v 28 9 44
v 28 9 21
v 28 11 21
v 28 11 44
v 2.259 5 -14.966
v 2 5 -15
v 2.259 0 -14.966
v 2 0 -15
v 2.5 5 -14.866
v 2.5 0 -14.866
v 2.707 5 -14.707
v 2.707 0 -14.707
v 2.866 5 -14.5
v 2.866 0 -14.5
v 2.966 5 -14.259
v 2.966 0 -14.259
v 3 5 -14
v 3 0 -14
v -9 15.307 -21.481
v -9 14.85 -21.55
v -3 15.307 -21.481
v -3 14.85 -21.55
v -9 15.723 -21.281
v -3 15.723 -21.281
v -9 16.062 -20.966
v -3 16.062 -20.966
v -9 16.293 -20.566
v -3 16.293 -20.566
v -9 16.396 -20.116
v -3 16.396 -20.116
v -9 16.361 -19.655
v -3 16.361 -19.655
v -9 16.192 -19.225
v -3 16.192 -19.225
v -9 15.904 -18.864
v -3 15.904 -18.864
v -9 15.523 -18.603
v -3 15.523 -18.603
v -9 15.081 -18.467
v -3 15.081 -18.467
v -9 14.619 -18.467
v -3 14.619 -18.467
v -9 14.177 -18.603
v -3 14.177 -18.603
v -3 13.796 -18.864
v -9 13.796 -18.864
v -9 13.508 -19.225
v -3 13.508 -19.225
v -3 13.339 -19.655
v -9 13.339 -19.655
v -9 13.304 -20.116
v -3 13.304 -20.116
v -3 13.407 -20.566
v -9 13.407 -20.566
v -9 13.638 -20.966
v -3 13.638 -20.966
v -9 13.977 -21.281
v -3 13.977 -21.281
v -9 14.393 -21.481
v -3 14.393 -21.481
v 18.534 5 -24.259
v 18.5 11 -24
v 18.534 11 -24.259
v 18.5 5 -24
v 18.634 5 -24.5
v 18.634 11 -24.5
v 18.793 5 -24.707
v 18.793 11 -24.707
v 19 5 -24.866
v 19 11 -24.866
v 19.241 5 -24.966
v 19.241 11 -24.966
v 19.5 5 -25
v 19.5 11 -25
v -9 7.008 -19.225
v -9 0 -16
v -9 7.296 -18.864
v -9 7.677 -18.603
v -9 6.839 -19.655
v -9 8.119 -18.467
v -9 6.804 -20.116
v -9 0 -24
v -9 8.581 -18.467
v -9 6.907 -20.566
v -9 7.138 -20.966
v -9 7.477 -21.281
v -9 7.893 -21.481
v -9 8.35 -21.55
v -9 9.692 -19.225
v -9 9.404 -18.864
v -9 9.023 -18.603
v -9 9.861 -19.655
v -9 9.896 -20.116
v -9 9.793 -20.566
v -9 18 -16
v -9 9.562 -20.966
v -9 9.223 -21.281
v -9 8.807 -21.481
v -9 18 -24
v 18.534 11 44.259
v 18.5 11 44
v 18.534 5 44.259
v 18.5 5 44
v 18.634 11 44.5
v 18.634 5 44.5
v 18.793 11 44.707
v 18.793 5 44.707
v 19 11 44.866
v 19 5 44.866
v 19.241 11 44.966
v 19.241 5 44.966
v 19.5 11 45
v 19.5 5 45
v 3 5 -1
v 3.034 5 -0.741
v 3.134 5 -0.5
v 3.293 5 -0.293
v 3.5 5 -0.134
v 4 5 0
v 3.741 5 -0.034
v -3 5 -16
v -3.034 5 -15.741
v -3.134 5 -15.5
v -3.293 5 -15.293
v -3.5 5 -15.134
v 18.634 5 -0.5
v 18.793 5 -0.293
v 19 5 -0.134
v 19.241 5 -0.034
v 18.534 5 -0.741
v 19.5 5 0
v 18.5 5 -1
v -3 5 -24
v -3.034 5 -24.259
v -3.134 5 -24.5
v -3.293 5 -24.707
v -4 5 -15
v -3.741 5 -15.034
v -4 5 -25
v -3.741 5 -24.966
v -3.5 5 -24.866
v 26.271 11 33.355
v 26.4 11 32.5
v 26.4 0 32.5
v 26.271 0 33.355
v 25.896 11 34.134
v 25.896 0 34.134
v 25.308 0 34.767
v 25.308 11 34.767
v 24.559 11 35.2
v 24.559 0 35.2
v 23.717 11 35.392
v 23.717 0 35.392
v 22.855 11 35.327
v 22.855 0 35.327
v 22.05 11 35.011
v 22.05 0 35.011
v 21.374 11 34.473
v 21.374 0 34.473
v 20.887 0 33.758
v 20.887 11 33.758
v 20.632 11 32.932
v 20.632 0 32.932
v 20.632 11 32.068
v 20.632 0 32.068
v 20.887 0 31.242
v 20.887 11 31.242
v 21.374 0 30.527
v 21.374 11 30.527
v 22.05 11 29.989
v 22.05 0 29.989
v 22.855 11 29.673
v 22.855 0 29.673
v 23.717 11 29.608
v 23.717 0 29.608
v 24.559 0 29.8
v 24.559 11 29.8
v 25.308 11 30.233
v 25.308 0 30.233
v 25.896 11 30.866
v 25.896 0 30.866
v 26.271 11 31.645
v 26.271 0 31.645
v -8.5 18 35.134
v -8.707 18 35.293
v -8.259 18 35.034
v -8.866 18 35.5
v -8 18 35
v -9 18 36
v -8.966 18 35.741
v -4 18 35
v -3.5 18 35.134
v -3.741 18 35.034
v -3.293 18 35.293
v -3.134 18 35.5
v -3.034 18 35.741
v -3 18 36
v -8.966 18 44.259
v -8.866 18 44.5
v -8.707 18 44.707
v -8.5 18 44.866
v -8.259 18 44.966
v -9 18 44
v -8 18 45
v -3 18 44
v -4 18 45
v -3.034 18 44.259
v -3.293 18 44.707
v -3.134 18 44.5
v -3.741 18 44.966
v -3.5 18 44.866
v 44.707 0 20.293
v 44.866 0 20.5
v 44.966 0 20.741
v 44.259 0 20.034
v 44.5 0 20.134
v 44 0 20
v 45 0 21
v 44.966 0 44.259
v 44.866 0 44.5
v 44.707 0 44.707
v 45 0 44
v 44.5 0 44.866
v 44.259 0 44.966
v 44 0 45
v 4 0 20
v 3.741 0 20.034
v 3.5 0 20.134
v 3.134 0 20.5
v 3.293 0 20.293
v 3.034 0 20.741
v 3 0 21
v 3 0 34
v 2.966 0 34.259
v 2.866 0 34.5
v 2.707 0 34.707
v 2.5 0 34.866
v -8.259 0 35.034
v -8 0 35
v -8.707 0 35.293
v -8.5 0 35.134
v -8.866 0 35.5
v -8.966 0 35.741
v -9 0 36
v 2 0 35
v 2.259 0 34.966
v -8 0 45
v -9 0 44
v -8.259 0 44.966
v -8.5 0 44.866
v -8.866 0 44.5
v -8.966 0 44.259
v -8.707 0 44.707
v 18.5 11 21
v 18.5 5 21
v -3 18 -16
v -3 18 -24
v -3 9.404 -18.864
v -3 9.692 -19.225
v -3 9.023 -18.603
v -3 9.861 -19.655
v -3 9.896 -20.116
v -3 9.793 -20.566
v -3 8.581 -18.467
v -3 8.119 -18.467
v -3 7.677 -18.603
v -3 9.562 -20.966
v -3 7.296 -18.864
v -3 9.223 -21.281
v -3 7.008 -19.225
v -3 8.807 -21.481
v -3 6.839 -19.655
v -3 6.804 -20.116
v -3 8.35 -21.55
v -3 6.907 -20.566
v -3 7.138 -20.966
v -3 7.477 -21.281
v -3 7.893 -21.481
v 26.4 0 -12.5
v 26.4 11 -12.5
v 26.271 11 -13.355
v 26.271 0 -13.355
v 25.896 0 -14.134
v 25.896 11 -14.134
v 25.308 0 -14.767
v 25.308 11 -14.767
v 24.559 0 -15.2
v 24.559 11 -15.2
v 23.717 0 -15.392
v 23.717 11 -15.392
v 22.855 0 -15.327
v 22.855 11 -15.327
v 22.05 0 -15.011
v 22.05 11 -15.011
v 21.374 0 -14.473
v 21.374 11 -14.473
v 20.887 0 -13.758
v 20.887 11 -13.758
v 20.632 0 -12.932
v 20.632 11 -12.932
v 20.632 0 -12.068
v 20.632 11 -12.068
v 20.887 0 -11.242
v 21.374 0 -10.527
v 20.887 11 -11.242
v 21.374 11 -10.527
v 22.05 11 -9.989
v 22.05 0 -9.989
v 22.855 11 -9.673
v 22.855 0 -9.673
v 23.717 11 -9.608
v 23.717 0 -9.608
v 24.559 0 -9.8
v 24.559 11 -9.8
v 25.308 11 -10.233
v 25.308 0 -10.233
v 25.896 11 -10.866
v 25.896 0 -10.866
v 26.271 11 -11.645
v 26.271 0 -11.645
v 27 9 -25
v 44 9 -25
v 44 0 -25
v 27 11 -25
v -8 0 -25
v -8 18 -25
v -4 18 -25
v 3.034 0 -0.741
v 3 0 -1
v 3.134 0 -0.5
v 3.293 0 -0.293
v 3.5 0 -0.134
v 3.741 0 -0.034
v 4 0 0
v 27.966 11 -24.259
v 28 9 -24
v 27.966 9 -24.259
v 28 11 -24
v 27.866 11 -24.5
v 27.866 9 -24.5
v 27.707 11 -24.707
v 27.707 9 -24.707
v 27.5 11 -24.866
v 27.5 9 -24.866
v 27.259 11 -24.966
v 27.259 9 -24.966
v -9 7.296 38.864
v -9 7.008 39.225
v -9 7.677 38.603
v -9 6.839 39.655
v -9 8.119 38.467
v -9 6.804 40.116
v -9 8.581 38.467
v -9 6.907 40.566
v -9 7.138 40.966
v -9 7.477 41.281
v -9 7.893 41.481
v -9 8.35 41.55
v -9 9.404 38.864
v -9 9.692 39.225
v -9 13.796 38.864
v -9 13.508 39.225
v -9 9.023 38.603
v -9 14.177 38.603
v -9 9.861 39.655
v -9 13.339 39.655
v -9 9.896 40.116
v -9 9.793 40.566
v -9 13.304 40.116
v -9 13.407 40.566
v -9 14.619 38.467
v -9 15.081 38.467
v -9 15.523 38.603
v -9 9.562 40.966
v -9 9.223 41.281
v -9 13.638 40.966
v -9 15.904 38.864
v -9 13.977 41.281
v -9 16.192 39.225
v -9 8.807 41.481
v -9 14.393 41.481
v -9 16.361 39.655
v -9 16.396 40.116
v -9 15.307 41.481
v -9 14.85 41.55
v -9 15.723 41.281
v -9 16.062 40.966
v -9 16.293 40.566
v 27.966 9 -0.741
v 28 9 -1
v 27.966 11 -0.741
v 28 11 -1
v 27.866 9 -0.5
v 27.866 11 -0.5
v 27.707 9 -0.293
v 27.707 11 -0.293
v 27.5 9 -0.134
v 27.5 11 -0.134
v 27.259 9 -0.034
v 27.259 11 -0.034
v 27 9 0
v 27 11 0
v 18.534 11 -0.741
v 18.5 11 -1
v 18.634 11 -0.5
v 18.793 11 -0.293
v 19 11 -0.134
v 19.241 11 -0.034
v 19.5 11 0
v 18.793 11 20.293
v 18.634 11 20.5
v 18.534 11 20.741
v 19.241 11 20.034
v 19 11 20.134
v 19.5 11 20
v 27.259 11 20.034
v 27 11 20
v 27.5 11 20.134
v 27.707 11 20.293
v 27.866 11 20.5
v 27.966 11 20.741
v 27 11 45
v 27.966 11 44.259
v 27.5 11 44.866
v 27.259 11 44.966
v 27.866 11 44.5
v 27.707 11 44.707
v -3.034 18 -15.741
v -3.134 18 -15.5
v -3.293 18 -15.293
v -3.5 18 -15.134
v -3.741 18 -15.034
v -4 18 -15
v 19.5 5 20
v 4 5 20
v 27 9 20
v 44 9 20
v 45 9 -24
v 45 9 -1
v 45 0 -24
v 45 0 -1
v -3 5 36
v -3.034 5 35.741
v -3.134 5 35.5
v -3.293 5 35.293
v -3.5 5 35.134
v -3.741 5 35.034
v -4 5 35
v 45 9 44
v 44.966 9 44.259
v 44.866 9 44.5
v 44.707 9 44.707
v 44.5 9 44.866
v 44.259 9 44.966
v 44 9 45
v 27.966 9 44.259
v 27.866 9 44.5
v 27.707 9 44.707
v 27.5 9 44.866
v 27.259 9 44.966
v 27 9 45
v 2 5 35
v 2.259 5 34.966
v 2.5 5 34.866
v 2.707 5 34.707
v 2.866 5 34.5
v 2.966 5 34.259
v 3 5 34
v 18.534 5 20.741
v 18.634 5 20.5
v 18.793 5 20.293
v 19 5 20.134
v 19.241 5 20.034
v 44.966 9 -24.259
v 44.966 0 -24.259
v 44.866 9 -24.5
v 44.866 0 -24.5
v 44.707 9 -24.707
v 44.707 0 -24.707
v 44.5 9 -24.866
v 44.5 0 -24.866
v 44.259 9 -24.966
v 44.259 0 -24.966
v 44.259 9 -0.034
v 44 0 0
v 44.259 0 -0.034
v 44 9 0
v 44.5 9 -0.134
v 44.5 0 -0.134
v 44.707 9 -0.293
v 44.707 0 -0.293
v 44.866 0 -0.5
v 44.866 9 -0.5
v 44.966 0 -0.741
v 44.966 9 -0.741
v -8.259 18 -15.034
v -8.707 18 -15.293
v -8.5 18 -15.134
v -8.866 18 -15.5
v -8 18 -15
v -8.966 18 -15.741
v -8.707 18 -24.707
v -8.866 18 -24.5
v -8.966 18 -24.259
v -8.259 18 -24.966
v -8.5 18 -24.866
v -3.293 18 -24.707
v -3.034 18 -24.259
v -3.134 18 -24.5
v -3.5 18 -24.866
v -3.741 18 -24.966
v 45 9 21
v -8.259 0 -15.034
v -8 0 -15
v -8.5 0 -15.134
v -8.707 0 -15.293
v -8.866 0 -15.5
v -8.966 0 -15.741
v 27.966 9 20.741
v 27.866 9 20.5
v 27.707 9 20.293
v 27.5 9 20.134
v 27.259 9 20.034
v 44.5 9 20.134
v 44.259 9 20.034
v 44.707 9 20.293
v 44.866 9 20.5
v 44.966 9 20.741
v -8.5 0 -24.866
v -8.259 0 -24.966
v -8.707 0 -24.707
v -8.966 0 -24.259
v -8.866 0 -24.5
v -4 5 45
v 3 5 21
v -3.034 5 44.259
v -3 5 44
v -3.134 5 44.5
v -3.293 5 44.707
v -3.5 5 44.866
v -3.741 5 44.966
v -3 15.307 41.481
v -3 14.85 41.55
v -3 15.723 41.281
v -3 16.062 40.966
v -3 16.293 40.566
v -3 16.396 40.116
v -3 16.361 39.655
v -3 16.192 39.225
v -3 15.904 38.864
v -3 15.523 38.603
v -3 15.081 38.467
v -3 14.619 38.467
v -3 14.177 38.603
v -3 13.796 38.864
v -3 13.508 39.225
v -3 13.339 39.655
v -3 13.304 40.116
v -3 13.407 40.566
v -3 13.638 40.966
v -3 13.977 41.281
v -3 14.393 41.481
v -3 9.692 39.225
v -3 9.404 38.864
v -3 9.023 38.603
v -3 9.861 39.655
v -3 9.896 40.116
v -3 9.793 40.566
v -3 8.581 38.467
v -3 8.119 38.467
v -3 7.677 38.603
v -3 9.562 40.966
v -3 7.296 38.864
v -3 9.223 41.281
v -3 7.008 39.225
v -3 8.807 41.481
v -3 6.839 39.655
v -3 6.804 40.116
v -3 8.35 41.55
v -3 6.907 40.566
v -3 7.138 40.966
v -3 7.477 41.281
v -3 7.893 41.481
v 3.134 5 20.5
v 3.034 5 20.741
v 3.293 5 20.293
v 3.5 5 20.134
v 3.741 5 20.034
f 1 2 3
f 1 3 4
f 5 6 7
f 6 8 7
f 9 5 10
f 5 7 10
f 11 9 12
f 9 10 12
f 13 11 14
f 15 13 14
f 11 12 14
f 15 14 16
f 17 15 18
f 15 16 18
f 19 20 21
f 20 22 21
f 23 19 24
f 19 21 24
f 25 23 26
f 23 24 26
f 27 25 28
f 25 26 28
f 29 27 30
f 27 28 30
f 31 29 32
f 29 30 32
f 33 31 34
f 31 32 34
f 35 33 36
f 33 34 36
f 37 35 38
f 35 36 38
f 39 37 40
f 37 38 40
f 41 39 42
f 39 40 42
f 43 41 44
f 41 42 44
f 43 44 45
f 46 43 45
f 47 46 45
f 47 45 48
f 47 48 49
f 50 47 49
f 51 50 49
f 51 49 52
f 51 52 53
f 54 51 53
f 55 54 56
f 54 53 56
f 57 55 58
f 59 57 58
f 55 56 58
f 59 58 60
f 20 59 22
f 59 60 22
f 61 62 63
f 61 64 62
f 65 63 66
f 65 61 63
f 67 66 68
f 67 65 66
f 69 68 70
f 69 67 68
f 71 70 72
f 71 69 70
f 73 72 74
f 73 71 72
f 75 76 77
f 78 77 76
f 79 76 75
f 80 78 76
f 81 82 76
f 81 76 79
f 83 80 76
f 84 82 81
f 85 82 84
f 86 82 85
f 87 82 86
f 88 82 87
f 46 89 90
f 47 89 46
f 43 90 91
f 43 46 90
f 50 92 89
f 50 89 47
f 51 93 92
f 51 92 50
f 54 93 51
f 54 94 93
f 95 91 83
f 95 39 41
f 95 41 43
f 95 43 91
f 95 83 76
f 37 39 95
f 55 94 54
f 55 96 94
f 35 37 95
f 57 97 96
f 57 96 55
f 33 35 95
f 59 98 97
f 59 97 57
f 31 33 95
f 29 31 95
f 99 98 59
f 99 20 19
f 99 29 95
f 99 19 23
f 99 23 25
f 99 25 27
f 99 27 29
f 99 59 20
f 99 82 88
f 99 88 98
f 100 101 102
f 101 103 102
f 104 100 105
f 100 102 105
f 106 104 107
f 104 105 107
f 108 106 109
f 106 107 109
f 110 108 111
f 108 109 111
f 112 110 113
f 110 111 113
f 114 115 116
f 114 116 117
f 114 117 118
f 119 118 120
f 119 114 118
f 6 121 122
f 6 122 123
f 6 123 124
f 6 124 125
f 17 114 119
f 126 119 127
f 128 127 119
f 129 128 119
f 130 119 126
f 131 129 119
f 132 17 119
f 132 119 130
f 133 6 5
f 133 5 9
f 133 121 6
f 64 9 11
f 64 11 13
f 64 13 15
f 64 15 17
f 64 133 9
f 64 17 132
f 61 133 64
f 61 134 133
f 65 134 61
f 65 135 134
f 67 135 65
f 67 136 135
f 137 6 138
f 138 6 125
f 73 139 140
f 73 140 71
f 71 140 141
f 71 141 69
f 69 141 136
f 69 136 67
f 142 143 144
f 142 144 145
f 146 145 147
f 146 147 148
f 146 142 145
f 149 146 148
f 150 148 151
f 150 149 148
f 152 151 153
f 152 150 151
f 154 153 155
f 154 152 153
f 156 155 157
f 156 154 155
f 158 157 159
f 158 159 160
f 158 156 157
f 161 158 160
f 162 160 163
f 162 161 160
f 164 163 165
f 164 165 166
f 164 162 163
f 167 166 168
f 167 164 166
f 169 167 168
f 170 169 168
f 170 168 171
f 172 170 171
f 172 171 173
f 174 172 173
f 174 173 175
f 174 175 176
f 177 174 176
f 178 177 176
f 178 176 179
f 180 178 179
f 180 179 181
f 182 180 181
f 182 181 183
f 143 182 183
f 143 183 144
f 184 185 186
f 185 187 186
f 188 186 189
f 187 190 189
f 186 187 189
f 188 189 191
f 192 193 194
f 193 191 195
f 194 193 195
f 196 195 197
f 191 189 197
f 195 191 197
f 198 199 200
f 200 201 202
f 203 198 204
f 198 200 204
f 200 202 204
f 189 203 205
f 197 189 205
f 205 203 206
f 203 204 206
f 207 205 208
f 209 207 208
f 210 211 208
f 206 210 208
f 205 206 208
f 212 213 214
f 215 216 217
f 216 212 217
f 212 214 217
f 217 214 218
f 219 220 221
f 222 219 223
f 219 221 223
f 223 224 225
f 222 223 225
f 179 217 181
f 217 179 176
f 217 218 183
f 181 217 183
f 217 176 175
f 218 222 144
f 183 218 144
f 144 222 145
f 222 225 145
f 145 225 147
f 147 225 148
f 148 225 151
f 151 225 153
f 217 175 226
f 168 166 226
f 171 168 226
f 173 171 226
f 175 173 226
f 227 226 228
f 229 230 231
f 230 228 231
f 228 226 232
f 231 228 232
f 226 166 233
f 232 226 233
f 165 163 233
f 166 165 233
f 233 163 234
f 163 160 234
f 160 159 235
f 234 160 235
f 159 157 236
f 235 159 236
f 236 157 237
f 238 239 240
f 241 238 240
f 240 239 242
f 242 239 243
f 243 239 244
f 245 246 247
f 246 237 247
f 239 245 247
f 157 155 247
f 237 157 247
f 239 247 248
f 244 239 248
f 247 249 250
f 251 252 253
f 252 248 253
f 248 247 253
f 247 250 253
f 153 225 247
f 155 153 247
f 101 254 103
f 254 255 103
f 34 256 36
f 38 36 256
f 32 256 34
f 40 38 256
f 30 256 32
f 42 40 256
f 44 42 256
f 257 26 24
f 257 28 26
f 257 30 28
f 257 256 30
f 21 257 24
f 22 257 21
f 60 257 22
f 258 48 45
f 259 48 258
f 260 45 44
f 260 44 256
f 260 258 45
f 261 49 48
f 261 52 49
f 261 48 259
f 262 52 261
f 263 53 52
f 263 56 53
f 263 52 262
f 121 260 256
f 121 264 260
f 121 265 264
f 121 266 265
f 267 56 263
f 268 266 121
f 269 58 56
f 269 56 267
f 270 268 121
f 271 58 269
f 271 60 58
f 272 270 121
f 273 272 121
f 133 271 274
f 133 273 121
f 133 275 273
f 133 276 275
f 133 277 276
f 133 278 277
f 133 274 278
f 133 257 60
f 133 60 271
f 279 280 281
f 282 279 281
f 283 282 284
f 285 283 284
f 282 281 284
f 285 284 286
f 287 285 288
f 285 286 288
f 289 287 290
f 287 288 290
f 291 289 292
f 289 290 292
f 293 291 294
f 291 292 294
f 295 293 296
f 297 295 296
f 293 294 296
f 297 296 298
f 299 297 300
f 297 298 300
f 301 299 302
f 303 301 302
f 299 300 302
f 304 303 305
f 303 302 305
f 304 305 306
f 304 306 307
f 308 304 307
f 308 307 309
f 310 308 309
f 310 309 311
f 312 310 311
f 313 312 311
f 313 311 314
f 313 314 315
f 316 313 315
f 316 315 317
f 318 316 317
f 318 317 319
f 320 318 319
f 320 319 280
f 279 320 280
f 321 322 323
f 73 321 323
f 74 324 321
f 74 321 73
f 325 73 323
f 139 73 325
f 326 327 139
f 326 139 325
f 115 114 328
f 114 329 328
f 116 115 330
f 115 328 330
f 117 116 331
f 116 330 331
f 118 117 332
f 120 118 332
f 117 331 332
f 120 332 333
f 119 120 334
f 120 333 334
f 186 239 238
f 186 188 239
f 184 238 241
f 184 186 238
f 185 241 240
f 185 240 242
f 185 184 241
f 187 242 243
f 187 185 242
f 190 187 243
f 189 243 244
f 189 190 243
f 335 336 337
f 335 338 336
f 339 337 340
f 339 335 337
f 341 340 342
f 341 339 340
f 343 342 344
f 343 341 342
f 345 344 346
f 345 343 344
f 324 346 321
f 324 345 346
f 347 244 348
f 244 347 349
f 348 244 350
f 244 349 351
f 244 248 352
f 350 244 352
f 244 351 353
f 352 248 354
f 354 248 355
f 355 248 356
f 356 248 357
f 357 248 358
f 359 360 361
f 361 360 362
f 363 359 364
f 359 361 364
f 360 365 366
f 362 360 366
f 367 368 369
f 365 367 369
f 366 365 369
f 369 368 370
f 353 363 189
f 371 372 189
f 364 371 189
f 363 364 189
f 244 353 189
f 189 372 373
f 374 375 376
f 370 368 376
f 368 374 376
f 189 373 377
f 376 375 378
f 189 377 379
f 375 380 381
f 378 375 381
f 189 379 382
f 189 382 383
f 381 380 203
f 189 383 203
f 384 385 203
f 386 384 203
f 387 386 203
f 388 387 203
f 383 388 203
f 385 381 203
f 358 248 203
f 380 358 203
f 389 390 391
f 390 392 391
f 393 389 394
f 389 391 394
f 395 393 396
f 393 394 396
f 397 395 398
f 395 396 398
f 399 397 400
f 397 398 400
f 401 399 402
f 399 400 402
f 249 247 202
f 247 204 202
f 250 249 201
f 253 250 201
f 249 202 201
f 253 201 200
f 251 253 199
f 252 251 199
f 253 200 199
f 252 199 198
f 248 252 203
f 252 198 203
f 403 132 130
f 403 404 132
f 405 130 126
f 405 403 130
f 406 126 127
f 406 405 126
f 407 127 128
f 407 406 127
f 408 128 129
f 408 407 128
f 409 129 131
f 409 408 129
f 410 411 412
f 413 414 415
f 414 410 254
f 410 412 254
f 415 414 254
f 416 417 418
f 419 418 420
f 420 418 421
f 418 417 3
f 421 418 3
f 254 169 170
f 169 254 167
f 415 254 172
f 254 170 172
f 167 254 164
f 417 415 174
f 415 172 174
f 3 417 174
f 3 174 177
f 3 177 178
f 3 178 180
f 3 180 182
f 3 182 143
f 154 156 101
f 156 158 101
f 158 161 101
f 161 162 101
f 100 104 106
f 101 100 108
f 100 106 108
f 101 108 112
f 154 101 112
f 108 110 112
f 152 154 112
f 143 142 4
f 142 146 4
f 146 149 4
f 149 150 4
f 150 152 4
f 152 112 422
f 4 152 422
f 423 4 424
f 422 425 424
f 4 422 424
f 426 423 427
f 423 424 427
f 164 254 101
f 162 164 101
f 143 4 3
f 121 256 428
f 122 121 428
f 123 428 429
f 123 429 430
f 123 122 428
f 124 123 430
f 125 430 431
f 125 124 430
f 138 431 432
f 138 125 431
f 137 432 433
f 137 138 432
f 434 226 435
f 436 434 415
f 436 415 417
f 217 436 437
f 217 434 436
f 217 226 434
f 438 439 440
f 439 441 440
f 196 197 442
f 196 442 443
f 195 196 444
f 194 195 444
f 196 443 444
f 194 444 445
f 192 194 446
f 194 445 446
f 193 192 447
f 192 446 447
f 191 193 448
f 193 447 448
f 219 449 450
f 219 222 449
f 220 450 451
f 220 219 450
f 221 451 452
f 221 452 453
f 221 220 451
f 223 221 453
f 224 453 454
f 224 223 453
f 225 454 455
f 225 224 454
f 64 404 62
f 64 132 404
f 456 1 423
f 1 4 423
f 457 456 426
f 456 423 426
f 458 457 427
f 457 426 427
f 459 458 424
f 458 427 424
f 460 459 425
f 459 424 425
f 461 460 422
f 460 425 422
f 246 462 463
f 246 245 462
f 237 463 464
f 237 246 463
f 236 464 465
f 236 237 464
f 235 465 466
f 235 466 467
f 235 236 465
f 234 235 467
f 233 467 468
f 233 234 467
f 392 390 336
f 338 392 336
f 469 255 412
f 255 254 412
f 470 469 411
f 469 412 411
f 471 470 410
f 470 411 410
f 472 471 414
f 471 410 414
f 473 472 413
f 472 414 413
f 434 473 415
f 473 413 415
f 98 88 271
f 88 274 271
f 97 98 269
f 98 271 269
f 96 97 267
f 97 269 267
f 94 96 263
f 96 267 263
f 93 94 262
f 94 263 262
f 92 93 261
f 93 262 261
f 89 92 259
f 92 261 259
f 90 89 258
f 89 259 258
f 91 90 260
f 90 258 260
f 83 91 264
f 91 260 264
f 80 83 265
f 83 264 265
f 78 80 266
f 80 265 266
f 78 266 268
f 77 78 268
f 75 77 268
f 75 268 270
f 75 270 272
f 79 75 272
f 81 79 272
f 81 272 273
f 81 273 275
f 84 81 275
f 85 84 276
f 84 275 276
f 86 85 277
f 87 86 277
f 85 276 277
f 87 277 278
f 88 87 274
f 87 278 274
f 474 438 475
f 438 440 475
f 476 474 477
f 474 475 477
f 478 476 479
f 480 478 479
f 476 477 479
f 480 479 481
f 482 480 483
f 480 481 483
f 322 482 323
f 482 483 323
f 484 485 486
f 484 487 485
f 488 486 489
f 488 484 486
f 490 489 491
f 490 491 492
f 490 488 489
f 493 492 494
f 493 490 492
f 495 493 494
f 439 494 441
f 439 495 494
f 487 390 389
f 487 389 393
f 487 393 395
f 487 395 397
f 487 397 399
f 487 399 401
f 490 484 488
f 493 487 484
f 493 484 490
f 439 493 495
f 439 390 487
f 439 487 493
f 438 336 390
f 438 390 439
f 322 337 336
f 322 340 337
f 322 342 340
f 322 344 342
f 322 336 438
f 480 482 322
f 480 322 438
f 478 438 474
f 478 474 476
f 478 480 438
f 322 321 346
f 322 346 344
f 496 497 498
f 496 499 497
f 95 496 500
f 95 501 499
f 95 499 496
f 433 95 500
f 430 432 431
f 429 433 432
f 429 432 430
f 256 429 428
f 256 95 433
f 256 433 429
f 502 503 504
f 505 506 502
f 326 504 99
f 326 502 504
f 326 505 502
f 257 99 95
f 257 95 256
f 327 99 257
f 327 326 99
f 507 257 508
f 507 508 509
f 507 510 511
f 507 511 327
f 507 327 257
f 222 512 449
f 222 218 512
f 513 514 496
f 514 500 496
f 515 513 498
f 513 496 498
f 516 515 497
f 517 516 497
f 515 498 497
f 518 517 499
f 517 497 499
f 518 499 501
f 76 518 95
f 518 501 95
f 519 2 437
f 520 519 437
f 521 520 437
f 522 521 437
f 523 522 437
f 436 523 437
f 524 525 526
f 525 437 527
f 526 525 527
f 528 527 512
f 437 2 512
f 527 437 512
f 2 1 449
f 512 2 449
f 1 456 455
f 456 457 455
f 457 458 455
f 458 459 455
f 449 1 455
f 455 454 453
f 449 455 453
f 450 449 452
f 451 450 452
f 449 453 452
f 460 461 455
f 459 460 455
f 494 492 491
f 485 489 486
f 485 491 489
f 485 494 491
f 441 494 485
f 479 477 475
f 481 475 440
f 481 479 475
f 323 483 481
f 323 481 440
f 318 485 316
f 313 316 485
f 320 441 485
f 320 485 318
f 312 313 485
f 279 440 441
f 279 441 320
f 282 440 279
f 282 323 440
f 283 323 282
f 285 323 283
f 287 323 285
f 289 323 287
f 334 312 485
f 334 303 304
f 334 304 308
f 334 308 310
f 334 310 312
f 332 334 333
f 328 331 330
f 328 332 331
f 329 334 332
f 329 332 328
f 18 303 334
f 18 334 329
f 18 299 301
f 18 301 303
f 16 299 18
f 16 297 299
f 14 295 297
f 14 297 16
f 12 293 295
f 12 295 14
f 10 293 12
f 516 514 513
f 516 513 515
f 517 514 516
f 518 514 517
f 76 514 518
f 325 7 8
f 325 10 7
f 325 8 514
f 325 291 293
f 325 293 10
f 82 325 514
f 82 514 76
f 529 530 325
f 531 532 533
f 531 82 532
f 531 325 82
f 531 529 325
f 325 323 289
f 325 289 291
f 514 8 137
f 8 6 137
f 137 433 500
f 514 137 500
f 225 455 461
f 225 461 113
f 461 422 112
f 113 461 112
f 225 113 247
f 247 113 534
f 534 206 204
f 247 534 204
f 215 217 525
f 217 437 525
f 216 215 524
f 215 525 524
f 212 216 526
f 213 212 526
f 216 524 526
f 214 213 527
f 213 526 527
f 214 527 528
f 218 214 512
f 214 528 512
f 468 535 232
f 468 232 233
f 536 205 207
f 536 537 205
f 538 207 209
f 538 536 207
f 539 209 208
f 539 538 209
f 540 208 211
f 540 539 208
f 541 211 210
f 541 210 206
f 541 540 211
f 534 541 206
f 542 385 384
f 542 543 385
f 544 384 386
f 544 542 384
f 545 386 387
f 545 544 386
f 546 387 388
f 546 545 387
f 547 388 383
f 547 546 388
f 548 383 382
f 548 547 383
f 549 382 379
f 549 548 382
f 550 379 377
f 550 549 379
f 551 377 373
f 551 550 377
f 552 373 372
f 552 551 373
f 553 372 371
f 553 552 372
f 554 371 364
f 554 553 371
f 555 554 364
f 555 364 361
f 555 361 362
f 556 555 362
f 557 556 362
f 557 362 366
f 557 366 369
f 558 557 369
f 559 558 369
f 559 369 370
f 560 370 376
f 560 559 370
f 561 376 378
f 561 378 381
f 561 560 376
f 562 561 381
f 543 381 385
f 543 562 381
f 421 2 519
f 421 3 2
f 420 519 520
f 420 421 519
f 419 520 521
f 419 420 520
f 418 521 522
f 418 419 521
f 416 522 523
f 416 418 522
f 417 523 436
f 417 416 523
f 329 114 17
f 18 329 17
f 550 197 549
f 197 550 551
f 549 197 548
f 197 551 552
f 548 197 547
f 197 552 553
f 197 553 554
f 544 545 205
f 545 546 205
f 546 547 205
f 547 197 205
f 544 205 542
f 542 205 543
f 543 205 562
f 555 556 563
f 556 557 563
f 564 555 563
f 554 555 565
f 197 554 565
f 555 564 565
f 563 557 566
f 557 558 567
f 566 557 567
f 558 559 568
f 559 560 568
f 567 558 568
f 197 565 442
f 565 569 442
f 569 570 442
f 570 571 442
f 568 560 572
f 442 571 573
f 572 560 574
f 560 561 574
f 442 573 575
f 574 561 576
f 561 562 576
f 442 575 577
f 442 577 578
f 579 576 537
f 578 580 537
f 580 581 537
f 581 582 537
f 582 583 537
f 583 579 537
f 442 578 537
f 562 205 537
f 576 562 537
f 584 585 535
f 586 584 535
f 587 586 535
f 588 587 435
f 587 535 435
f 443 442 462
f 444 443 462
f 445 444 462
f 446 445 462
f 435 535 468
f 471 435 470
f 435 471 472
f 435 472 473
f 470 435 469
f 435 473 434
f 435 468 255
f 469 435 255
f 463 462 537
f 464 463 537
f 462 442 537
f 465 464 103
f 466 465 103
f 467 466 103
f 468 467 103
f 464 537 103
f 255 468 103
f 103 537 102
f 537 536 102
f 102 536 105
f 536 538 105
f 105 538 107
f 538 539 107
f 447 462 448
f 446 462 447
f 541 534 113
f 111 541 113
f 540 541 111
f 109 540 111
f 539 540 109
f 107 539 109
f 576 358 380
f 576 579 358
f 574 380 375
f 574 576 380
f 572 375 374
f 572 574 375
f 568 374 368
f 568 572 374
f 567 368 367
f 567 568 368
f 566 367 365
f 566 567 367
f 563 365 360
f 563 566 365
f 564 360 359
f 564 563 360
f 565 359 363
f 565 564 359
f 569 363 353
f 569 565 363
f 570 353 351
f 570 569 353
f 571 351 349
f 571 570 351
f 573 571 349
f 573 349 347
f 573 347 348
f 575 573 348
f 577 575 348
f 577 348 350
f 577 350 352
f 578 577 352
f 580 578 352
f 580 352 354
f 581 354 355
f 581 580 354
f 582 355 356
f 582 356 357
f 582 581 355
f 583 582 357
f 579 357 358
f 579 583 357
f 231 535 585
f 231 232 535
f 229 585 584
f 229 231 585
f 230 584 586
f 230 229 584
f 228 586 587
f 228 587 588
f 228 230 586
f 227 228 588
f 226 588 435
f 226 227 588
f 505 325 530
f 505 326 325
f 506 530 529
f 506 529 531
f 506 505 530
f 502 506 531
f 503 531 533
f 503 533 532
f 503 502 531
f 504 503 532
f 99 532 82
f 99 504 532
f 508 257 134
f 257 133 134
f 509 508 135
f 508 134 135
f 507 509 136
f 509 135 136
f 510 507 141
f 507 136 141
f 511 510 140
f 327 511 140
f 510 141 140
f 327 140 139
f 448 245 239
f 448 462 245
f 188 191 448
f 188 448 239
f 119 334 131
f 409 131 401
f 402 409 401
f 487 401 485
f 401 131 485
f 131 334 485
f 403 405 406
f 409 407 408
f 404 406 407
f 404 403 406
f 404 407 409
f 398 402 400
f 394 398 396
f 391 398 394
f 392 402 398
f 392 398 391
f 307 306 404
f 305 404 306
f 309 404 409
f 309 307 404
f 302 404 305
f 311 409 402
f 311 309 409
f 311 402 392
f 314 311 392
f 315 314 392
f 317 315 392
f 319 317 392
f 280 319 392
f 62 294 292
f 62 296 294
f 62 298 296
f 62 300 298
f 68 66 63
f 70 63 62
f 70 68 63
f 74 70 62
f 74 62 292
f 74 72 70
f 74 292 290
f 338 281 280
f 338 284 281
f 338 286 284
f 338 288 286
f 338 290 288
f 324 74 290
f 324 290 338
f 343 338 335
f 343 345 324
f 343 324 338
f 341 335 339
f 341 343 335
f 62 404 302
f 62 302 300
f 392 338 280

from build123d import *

# Parameters (mm, degrees)
SKETCH1_W                  = 45
SKETCH1_H                  = 25
BOSS_EXTRUDE1_DEPTH        = 5
SKETCH5_W                  = 26.5
SKETCH5_H                  = 25
BOSS_EXTRUDE3_DEPTH        = 4
SKETCH11_W                 = 9.5
SKETCH11_H                 = 25
BOSS_EXTRUDE5_DEPTH        = 2
SKETCH12_W                 = 3
SKETCH12_H                 = 25
CUT_EXTRUDE2_DEPTH         = 52.826634079
M5_CLEARANCE_HOLE1_D       = 5.8
BOSS_EXTRUDE8_DEPTH        = 10
M2_5_CLEARANCE_HOLE1_D     = 3.1
M2_5_CLEARANCE_HOLE1_DEPTH = 6
M2_5_CLEARANCE_HOLE1_TIP   = 0.931333959
FILLET2_R                  = 1


with BuildPart() as part:
    # Sketch1 → Boss-Extrude1 (new body)
    with BuildSketch(Plane(origin=(0, 0, 0), x_dir=(1, 0, 0), z_dir=(0, 1, 0))):
        with Locations((22.5, 12.5)):
            Rectangle(SKETCH1_W, SKETCH1_H)
    extrude(amount=BOSS_EXTRUDE1_DEPTH)

    # Sketch5 → Boss-Extrude3 (add)
    with BuildSketch(Plane(origin=(0, 5, 0), x_dir=(1, 0, 0), z_dir=(0, 1, 0))):
        with Locations((31.75, 12.5)):
            Rectangle(SKETCH5_W, SKETCH5_H)
    extrude(amount=BOSS_EXTRUDE3_DEPTH)

    # Sketch11 → Boss-Extrude5 (add)
    with BuildSketch(Plane(origin=(0, 9, 0), x_dir=(1, 0, 0), z_dir=(0, 1, 0))):
        with Locations((23.25, 12.5)):
            Rectangle(SKETCH11_W, SKETCH11_H)
    extrude(amount=BOSS_EXTRUDE5_DEPTH)

    # Sketch12 → Cut-Extrude2 (cut, through all)
    with BuildSketch(Plane(origin=(0, 5, 0), x_dir=(1, 0, 0), z_dir=(0, 1, 0))):
        with Locations((1.5, 12.5)):
            Rectangle(SKETCH12_W, SKETCH12_H)
    extrude(amount=-CUT_EXTRUDE2_DEPTH, mode=Mode.SUBTRACT)

    # M5 Clearance Hole1 (through all)
    with Locations(Plane(origin=(0, 0, 0), x_dir=(-1, 0, 0), z_dir=(0, -1, 0))):
        with Locations((-23.5, 12.5)):
            Hole(M5_CLEARANCE_HOLE1_D / 2)

    # Sketch18 → Boss-Extrude8 (add)
    with BuildSketch(Plane(origin=(0, 0, -25), x_dir=(-1, 0, 0), z_dir=(0, 0, -1))):
        Polygon((-3, 0), (9, 0), (9, 18), (3, 18), (3, 5), (-3, 5), align=None)
    extrude(amount=-BOSS_EXTRUDE8_DEPTH)

    # M2.5 Clearance Hole1
    with Locations(Plane.ZY.offset(9)):
        with Locations((-20, 14.85), (-20, 8.35)):
            Hole(M2_5_CLEARANCE_HOLE1_D / 2, depth=M2_5_CLEARANCE_HOLE1_DEPTH)
            with Locations((0, 0, -(M2_5_CLEARANCE_HOLE1_DEPTH + M2_5_CLEARANCE_HOLE1_TIP / 2))):  # 118° drill point
                Cone(0, M2_5_CLEARANCE_HOLE1_D / 2, M2_5_CLEARANCE_HOLE1_TIP, mode=Mode.SUBTRACT)

    # Fillet2
    fillet2_edges = [part.edges().sort_by_distance(p)[0] for p in [
        (18.5, 8, -25),
        (18.5, 8, 0),
        (28, 10, 0),
        (28, 10, -25),
        (3, 2.5, 0),
        (3, 2.5, -15),
        (-3, 11.5, -15),
        (-9, 9, -15),
        (-9, 9, -25),
        (-3, 11.5, -25),
        (45, 4.5, -25),
        (45, 4.5, 0),
    ]]
    fillet(fillet2_edges, radius=FILLET2_R)


with BuildPart() as body_2:
    # Mirror2: mirrored copy
    add(part.part.mirror(Plane.XY.offset(10)))


solid = Compound([part.part, body_2.part])
